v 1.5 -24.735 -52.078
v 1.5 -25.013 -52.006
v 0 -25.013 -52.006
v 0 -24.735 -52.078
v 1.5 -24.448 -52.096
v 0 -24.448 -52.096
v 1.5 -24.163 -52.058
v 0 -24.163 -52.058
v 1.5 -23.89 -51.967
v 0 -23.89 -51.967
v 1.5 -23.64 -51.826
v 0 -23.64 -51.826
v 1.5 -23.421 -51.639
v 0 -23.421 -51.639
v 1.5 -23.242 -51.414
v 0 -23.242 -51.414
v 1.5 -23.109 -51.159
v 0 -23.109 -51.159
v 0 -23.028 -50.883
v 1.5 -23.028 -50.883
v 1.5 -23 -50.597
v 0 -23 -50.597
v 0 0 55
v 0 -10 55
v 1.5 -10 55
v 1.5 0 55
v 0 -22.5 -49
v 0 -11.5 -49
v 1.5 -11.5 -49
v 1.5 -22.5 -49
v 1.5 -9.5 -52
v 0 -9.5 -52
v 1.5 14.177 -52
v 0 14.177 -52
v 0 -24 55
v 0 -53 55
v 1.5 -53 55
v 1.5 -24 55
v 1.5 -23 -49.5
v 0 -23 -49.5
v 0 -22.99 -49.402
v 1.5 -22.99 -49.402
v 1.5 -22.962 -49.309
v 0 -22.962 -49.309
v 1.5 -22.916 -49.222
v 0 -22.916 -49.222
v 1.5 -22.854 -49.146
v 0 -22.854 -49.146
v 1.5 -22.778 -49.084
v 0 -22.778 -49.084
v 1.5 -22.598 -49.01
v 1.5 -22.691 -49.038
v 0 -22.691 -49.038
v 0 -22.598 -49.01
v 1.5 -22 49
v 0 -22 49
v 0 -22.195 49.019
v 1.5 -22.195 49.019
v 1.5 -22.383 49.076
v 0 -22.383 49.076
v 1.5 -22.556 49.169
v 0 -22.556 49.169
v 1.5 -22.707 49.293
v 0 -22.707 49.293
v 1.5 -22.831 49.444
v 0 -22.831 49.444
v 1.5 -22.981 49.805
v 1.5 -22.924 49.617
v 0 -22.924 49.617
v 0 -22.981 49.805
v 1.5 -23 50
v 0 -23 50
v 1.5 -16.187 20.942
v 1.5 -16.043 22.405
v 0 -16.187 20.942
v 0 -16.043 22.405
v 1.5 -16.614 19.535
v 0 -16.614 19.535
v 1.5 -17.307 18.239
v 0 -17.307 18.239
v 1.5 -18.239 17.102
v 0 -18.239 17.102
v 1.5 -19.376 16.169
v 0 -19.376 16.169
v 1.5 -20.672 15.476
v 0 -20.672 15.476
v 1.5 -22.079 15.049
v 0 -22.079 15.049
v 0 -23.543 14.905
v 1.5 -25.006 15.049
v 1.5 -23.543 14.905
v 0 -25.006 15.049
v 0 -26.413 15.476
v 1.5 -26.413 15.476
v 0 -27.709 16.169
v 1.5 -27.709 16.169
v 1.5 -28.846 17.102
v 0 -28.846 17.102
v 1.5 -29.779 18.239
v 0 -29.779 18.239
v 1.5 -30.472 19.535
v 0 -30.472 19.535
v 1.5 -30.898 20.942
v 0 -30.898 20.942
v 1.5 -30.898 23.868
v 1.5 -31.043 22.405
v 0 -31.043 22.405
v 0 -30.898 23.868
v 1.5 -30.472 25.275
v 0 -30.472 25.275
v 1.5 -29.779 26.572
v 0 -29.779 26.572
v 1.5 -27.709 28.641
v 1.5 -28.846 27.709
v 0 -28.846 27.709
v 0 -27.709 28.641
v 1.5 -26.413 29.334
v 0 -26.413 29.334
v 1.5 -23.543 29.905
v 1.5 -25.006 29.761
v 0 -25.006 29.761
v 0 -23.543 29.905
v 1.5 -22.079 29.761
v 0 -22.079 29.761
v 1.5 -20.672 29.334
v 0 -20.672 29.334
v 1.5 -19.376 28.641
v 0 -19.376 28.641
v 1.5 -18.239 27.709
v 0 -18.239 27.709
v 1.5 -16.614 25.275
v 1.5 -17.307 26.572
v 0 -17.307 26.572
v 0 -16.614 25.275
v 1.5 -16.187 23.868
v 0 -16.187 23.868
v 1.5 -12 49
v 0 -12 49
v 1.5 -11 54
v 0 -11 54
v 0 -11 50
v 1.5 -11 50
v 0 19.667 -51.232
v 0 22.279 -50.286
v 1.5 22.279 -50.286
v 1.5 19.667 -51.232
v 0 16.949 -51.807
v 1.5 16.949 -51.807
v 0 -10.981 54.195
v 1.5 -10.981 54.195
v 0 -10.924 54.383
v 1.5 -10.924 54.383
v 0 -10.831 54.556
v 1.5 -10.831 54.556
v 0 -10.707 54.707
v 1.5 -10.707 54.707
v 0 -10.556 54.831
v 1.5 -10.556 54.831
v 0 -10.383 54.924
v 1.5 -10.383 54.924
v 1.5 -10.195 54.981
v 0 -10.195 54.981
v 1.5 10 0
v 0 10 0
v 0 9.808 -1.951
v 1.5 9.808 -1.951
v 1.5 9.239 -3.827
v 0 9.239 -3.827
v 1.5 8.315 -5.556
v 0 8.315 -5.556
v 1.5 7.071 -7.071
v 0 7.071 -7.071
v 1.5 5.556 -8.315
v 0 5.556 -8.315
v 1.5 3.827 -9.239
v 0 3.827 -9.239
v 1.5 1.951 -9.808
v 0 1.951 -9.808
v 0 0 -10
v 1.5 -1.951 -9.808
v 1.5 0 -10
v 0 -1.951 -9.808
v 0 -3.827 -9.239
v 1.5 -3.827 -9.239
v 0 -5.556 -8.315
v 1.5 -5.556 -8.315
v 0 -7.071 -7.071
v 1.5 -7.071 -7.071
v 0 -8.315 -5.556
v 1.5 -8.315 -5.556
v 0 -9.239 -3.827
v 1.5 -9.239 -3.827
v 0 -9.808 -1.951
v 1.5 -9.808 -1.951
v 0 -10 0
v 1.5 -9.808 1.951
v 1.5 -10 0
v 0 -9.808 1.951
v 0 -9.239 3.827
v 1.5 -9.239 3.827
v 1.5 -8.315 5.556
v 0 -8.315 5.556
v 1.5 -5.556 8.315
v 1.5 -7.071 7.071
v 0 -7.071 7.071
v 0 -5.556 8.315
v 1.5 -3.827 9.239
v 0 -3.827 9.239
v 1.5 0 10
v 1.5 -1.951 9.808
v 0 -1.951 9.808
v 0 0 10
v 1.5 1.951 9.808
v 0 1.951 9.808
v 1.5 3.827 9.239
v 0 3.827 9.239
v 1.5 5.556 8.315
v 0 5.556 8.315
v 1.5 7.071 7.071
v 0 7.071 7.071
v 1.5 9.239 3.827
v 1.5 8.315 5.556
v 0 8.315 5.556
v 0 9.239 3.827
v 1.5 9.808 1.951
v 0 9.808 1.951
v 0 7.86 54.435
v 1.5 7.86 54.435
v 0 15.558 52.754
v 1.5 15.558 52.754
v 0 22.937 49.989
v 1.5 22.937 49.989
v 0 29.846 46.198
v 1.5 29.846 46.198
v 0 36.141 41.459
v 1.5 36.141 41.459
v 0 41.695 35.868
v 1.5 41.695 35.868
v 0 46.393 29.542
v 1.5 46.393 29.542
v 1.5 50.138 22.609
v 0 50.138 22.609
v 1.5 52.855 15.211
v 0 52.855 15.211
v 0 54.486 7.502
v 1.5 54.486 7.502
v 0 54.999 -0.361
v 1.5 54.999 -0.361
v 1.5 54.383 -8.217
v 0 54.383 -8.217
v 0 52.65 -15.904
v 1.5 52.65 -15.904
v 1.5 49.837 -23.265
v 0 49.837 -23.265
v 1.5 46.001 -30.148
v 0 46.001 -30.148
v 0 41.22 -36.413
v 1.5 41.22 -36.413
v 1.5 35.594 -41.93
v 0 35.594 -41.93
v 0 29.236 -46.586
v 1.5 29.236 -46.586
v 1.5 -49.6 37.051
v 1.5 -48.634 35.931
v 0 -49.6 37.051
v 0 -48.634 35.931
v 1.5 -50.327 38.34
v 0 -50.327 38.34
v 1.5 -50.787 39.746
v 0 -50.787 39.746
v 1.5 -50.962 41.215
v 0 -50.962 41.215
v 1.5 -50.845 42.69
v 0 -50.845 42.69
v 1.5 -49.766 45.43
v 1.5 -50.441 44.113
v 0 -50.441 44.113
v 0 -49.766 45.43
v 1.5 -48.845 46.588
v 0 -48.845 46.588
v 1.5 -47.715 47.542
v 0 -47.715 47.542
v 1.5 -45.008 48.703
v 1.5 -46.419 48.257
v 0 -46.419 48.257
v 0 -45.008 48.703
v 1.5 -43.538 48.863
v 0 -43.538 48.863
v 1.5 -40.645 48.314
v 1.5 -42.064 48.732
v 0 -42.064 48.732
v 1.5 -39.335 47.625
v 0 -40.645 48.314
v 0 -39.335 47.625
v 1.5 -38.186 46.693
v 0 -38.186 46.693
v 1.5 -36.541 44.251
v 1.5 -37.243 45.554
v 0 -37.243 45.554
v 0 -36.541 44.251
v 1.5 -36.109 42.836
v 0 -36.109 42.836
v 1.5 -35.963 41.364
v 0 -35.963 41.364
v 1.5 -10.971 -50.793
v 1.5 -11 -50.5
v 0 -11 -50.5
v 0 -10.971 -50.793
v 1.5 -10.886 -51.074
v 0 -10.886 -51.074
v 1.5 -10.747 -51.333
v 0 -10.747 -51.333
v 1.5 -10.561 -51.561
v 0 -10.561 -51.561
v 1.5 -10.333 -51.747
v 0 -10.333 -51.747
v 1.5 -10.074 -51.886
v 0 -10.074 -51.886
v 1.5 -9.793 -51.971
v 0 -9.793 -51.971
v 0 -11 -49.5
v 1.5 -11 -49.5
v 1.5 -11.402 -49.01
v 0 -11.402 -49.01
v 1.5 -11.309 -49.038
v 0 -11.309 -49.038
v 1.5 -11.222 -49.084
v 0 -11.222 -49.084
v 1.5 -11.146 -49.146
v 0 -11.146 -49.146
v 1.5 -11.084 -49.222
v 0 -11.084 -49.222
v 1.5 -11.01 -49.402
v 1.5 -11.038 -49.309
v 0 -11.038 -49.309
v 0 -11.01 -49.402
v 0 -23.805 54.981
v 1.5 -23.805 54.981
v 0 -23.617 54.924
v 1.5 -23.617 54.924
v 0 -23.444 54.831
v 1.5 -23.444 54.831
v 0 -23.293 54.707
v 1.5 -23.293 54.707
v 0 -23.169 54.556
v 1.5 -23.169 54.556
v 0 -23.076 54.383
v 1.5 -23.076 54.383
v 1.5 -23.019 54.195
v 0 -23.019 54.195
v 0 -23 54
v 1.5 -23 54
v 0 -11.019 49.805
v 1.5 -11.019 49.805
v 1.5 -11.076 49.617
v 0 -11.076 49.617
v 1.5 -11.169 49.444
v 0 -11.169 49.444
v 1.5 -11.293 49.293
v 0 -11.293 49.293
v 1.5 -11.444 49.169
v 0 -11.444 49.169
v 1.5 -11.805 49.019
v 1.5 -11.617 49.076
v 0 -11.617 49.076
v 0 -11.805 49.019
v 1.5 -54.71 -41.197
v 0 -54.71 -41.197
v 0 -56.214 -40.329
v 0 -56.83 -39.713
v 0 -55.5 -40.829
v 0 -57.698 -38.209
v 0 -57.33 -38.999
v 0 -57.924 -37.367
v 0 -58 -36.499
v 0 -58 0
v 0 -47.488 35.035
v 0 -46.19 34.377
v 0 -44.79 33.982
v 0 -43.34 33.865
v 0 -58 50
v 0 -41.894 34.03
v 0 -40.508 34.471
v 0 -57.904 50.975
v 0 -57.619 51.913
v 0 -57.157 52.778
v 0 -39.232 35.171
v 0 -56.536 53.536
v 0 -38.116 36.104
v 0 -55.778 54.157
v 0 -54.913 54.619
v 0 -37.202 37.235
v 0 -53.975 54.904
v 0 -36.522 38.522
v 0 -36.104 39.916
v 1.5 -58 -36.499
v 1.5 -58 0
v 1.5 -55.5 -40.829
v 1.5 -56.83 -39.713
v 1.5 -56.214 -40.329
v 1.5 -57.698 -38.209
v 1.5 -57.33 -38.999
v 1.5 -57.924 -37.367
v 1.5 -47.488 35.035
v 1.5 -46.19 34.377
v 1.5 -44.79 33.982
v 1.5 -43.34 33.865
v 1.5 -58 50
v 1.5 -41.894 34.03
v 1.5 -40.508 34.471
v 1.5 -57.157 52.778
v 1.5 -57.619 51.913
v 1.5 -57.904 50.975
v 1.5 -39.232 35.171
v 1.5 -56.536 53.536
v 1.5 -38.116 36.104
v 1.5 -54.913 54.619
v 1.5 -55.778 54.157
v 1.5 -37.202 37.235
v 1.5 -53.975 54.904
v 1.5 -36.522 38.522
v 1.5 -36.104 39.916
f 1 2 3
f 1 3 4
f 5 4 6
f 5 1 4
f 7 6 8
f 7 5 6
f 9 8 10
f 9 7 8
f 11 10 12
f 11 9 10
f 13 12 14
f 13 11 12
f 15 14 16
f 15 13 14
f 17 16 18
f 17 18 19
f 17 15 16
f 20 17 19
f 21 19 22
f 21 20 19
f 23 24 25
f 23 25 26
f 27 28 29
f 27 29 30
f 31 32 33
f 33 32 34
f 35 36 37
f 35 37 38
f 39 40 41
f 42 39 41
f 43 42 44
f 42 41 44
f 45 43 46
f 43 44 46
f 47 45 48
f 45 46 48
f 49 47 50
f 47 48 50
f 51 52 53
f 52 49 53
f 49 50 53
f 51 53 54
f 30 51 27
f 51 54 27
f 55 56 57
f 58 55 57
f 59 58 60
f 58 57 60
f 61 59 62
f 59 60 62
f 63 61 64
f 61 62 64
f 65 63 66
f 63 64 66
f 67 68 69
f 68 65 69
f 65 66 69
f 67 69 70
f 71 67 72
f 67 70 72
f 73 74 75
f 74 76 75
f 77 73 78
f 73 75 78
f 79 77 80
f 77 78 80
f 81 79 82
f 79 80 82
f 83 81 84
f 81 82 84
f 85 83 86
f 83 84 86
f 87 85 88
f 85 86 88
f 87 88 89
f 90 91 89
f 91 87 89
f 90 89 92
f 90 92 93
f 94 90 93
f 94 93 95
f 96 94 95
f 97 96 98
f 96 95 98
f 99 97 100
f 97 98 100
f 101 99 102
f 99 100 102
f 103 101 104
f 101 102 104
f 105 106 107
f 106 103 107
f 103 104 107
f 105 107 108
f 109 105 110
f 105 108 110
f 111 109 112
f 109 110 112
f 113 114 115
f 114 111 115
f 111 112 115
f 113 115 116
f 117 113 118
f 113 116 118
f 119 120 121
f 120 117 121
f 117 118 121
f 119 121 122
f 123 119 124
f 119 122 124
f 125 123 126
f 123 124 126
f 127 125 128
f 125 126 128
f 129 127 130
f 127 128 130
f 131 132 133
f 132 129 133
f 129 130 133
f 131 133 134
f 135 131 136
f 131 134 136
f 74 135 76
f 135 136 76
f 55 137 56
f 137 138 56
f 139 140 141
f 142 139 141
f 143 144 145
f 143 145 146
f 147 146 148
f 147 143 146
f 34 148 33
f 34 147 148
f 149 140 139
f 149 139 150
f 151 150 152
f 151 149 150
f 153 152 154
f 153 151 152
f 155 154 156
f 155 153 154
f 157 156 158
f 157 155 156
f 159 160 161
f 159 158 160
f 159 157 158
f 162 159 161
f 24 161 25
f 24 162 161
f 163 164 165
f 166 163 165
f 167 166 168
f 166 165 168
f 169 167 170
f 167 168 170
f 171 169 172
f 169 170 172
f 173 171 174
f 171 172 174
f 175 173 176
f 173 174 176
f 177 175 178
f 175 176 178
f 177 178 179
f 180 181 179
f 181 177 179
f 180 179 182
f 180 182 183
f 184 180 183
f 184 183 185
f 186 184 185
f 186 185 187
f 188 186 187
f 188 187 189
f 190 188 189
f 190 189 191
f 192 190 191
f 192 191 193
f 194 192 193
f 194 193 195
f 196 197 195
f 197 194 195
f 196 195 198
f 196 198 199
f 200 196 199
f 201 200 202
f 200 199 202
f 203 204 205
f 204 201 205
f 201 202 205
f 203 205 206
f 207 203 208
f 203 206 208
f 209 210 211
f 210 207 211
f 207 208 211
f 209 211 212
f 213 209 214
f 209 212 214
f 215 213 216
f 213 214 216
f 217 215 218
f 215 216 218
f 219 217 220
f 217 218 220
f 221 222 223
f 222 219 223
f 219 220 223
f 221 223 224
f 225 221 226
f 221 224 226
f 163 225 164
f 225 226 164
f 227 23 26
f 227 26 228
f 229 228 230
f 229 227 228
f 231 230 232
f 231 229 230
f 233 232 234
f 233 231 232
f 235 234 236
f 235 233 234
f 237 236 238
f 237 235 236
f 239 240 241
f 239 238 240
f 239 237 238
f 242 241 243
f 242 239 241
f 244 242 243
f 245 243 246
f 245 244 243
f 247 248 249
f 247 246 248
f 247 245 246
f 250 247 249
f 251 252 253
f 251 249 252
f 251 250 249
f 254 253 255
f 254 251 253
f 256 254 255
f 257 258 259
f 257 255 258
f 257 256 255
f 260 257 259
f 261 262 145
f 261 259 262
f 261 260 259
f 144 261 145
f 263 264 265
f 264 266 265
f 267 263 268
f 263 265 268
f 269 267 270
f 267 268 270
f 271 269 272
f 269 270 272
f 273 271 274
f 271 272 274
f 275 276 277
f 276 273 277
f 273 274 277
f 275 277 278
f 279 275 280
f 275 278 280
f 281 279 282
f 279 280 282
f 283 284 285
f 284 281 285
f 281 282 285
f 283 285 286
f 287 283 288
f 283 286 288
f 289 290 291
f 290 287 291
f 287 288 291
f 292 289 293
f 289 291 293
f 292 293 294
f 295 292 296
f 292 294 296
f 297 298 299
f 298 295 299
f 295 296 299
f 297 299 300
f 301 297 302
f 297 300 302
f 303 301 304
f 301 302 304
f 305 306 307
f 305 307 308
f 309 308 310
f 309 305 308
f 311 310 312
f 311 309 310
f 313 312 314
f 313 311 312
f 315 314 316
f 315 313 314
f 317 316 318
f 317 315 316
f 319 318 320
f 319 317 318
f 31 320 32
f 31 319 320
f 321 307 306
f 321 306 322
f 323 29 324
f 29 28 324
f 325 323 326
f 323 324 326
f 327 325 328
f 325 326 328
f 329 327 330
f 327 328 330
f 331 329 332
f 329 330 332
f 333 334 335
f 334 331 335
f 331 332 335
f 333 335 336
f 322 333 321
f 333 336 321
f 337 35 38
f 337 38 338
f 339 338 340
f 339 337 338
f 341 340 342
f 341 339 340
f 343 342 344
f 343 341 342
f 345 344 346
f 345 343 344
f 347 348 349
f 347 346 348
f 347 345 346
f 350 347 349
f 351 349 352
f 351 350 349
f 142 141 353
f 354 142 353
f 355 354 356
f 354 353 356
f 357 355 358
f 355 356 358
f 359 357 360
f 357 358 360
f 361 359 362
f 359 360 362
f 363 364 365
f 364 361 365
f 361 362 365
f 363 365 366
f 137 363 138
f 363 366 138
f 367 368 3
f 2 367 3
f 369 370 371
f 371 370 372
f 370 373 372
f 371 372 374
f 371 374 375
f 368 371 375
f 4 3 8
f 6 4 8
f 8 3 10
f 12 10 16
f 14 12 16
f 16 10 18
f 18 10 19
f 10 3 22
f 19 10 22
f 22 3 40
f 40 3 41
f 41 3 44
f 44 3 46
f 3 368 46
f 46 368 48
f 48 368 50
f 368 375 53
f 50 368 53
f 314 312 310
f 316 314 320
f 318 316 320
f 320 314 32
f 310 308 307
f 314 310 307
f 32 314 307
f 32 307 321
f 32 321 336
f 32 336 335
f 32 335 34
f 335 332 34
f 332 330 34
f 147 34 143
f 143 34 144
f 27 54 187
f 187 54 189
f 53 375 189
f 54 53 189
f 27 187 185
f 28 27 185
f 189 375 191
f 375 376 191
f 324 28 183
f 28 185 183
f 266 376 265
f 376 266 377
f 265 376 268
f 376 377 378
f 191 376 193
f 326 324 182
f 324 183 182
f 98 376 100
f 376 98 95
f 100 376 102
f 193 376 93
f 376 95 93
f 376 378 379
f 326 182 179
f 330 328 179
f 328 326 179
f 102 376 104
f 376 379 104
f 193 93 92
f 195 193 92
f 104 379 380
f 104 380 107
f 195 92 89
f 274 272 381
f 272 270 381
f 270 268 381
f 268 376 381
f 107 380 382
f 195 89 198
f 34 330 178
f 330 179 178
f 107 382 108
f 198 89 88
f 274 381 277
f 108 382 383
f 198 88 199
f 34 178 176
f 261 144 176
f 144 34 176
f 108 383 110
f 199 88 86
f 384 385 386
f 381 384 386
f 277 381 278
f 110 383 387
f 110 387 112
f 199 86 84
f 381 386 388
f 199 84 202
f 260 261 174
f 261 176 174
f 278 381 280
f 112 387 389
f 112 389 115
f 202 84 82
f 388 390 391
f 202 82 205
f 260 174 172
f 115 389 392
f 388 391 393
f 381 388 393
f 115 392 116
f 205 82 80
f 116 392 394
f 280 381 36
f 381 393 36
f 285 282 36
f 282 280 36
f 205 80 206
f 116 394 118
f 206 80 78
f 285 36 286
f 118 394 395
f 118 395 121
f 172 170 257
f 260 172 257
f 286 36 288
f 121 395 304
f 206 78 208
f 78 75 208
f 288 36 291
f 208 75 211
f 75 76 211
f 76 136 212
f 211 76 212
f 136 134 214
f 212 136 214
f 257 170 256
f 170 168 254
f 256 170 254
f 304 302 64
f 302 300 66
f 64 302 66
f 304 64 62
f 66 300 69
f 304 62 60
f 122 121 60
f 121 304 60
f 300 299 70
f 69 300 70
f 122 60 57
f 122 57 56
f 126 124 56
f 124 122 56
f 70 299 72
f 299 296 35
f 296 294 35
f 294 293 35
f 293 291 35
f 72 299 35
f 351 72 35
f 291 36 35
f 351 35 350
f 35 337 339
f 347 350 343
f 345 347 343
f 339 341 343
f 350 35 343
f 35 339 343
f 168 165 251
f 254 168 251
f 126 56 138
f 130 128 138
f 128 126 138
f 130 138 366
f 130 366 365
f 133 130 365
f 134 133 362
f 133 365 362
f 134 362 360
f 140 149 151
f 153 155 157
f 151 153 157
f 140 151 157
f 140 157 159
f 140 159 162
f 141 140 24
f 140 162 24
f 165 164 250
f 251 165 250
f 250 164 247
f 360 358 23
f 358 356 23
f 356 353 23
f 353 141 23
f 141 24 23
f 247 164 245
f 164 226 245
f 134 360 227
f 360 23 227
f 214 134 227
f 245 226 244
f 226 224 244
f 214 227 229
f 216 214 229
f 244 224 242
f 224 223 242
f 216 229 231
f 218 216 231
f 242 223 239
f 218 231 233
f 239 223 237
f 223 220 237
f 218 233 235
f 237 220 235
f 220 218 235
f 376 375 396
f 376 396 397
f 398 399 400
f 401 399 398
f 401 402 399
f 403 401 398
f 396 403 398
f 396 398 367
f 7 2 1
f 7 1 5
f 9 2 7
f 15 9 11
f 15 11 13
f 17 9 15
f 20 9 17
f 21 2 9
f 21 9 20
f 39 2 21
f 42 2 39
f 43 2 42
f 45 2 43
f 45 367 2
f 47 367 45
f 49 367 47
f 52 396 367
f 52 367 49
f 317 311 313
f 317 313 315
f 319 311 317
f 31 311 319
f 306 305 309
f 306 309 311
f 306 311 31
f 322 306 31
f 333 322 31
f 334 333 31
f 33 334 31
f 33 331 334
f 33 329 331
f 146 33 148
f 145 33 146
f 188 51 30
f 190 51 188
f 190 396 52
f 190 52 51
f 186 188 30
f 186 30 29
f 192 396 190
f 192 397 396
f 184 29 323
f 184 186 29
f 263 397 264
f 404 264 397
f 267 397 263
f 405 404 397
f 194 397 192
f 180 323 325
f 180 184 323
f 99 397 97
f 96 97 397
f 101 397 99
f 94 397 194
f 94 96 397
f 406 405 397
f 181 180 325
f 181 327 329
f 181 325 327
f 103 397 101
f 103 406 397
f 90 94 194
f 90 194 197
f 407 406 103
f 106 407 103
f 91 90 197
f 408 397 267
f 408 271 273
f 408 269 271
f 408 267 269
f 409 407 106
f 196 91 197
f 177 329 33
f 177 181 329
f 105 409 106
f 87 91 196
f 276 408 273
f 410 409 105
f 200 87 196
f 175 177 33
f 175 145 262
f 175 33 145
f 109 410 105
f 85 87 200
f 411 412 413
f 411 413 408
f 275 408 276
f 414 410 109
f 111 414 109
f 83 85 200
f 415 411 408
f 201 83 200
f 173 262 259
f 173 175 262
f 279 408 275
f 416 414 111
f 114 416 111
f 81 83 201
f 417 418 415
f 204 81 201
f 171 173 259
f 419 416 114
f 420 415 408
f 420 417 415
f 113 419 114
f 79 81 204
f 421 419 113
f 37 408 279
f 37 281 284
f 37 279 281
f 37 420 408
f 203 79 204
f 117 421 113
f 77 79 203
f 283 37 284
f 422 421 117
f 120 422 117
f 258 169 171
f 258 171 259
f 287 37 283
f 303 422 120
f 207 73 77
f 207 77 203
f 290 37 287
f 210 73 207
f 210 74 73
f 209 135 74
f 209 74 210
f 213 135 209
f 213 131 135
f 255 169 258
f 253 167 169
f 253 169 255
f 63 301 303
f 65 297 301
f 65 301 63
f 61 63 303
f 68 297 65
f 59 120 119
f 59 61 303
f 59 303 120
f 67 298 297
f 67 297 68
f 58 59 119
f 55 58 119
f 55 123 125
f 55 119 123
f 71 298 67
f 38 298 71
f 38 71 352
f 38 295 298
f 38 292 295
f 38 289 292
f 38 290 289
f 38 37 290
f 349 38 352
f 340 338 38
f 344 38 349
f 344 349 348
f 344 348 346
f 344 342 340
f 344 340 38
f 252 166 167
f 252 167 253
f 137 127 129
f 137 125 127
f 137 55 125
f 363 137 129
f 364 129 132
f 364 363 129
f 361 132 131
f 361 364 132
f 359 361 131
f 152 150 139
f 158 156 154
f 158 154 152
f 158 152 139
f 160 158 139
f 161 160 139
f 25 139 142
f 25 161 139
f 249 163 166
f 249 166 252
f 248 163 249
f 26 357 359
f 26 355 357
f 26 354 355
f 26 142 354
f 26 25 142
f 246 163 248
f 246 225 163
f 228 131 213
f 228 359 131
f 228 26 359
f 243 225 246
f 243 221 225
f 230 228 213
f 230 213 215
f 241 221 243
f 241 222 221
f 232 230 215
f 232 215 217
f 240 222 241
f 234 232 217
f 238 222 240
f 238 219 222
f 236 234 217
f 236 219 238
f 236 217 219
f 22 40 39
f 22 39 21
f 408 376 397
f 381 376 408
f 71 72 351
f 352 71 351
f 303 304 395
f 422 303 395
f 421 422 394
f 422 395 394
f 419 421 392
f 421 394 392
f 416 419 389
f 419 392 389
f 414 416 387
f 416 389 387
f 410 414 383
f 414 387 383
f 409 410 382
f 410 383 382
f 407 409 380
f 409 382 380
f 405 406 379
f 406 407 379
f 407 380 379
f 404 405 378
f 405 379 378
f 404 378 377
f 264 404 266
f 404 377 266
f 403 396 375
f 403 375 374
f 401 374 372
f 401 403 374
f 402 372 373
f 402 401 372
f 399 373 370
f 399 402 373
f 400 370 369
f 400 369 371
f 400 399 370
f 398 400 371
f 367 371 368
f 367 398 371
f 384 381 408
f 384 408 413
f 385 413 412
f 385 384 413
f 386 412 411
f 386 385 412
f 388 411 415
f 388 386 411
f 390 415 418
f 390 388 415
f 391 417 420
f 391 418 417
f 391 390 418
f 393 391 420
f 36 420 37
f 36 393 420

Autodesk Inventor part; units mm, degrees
ref_plane "YZ Plane" through (0, 0, 0) normal (1, 0, 0) x (0, 1, 0)
ref_plane "XZ Plane" through (0, 0, 0) normal (0, 1, 0) x (-1, 0, 0)
ref_plane "XY Plane" through (0, 0, 0) normal (0, 0, 1) x (1, 0, 0)
sketch "Sketch1" plane through (0, 0, 0) normal (1, 0, 0) x (0, 1, 0)
  line L0 (-58, -40) -> (-58, 50)
  line L1 (0, 0) -> (-57.3223, 54.5531) construction
  circle A0 centre (-23.5426, 22.4053) radius 7.5
  circle A1 centre (0, 0) radius 47 construction
  circle A2 centre (-43.4633, 41.3636) radius 7.5
  circle A3 centre (0, 0) radius 10
  line L2 (-11, -52) -> (14.1774, -52)
  line L3 (-58, 0) -> (-58, -40)
  line L4 (0, 0) -> (0, -52) construction
  line L5 (-58, -40) -> (-23, -52.739)
  circle A4 centre (0, 0) radius 50 construction
  arc A5 (22.2788, -50.2857) -> (0, 55) centre (0, 0) ccw
  line L6 (-43.4633, 41.3636) -> (-48.6337, 35.9307)
  arc A6 (-53, 55) -> (-58, 50) centre (-53, 50) ccw
  line L7 (-11, 54) -> (-11, 50)
  line L8 (-12, 49) -> (-22, 49)
  line L9 (-23, 50) -> (-23, 54)
  line L10 (-53, 55) -> (-24, 55)
  line L11 (-10, 55) -> (0, 55)
  arc A7 (-23, 54) -> (-24, 55) centre (-24, 54) ccw
  arc A8 (-10, 55) -> (-11, 54) centre (-10, 54) ccw
  arc A9 (-12, 49) -> (-11, 50) centre (-12, 50) ccw
  arc A10 (-23, 50) -> (-22, 49) centre (-22, 50) ccw
  arc A11 (14.1774, -52) -> (22.2788, -50.2857) centre (14.1774, -32) ccw
  line L12 (-23, -49.5) -> (-23, -52.739)
  line L13 (-11, -52) -> (-11, -49.5)
  line L14 (-11.5, -49) -> (-22.5, -49)
  arc A12 (-11, -49.5) -> (-11.5, -49) centre (-11.5, -49.5) ccw
  arc A13 (-22.5, -49) -> (-23, -49.5) centre (-22.5, -49.5) ccw
  point P0 (-28.9755, 27.5757)
  point P1 (-57.7919, 55)
  point P2 (-58, 55)
  point P3 (-25.2108, 39.6663)
  point P4 (17.9165, -52)
  point P5 (-23, 55)
  point P6 (-11, 52)
  dimension "d4" = 94
  dimension "d6" = 15
  dimension "d7" = 15
  dimension "d3" = 32.5
  dimension "d8" = 60
  dimension "d9" = 20
  dimension "d13" = 52
  dimension "d20" = 100
  dimension "d31" = 55
  dimension "d34" = 58
  dimension "d52" = 5
  dimension "d54" = 47
  dimension "d56" = 1
  dimension "d59" = 20
  dimension "d60" = 12
  dimension "d61" = 6
  dimension "d65" = 0.5
  dimension "d69" = 95
  dimension "d72" = 110
  dimension "d73" = 3
  dimension "d74" = 12
extrude "Extrusion3" add sketch "Sketch1" along normal blind 1.5
fillet "Fillet1" radius 5 1 edges at (0.75, -58, -40)
fillet "Fillet2" radius 1.5 2 edges at (0.75, -23, -52.739) (0.75, -11, -52)
properties part number "InnerFlange27130914"
